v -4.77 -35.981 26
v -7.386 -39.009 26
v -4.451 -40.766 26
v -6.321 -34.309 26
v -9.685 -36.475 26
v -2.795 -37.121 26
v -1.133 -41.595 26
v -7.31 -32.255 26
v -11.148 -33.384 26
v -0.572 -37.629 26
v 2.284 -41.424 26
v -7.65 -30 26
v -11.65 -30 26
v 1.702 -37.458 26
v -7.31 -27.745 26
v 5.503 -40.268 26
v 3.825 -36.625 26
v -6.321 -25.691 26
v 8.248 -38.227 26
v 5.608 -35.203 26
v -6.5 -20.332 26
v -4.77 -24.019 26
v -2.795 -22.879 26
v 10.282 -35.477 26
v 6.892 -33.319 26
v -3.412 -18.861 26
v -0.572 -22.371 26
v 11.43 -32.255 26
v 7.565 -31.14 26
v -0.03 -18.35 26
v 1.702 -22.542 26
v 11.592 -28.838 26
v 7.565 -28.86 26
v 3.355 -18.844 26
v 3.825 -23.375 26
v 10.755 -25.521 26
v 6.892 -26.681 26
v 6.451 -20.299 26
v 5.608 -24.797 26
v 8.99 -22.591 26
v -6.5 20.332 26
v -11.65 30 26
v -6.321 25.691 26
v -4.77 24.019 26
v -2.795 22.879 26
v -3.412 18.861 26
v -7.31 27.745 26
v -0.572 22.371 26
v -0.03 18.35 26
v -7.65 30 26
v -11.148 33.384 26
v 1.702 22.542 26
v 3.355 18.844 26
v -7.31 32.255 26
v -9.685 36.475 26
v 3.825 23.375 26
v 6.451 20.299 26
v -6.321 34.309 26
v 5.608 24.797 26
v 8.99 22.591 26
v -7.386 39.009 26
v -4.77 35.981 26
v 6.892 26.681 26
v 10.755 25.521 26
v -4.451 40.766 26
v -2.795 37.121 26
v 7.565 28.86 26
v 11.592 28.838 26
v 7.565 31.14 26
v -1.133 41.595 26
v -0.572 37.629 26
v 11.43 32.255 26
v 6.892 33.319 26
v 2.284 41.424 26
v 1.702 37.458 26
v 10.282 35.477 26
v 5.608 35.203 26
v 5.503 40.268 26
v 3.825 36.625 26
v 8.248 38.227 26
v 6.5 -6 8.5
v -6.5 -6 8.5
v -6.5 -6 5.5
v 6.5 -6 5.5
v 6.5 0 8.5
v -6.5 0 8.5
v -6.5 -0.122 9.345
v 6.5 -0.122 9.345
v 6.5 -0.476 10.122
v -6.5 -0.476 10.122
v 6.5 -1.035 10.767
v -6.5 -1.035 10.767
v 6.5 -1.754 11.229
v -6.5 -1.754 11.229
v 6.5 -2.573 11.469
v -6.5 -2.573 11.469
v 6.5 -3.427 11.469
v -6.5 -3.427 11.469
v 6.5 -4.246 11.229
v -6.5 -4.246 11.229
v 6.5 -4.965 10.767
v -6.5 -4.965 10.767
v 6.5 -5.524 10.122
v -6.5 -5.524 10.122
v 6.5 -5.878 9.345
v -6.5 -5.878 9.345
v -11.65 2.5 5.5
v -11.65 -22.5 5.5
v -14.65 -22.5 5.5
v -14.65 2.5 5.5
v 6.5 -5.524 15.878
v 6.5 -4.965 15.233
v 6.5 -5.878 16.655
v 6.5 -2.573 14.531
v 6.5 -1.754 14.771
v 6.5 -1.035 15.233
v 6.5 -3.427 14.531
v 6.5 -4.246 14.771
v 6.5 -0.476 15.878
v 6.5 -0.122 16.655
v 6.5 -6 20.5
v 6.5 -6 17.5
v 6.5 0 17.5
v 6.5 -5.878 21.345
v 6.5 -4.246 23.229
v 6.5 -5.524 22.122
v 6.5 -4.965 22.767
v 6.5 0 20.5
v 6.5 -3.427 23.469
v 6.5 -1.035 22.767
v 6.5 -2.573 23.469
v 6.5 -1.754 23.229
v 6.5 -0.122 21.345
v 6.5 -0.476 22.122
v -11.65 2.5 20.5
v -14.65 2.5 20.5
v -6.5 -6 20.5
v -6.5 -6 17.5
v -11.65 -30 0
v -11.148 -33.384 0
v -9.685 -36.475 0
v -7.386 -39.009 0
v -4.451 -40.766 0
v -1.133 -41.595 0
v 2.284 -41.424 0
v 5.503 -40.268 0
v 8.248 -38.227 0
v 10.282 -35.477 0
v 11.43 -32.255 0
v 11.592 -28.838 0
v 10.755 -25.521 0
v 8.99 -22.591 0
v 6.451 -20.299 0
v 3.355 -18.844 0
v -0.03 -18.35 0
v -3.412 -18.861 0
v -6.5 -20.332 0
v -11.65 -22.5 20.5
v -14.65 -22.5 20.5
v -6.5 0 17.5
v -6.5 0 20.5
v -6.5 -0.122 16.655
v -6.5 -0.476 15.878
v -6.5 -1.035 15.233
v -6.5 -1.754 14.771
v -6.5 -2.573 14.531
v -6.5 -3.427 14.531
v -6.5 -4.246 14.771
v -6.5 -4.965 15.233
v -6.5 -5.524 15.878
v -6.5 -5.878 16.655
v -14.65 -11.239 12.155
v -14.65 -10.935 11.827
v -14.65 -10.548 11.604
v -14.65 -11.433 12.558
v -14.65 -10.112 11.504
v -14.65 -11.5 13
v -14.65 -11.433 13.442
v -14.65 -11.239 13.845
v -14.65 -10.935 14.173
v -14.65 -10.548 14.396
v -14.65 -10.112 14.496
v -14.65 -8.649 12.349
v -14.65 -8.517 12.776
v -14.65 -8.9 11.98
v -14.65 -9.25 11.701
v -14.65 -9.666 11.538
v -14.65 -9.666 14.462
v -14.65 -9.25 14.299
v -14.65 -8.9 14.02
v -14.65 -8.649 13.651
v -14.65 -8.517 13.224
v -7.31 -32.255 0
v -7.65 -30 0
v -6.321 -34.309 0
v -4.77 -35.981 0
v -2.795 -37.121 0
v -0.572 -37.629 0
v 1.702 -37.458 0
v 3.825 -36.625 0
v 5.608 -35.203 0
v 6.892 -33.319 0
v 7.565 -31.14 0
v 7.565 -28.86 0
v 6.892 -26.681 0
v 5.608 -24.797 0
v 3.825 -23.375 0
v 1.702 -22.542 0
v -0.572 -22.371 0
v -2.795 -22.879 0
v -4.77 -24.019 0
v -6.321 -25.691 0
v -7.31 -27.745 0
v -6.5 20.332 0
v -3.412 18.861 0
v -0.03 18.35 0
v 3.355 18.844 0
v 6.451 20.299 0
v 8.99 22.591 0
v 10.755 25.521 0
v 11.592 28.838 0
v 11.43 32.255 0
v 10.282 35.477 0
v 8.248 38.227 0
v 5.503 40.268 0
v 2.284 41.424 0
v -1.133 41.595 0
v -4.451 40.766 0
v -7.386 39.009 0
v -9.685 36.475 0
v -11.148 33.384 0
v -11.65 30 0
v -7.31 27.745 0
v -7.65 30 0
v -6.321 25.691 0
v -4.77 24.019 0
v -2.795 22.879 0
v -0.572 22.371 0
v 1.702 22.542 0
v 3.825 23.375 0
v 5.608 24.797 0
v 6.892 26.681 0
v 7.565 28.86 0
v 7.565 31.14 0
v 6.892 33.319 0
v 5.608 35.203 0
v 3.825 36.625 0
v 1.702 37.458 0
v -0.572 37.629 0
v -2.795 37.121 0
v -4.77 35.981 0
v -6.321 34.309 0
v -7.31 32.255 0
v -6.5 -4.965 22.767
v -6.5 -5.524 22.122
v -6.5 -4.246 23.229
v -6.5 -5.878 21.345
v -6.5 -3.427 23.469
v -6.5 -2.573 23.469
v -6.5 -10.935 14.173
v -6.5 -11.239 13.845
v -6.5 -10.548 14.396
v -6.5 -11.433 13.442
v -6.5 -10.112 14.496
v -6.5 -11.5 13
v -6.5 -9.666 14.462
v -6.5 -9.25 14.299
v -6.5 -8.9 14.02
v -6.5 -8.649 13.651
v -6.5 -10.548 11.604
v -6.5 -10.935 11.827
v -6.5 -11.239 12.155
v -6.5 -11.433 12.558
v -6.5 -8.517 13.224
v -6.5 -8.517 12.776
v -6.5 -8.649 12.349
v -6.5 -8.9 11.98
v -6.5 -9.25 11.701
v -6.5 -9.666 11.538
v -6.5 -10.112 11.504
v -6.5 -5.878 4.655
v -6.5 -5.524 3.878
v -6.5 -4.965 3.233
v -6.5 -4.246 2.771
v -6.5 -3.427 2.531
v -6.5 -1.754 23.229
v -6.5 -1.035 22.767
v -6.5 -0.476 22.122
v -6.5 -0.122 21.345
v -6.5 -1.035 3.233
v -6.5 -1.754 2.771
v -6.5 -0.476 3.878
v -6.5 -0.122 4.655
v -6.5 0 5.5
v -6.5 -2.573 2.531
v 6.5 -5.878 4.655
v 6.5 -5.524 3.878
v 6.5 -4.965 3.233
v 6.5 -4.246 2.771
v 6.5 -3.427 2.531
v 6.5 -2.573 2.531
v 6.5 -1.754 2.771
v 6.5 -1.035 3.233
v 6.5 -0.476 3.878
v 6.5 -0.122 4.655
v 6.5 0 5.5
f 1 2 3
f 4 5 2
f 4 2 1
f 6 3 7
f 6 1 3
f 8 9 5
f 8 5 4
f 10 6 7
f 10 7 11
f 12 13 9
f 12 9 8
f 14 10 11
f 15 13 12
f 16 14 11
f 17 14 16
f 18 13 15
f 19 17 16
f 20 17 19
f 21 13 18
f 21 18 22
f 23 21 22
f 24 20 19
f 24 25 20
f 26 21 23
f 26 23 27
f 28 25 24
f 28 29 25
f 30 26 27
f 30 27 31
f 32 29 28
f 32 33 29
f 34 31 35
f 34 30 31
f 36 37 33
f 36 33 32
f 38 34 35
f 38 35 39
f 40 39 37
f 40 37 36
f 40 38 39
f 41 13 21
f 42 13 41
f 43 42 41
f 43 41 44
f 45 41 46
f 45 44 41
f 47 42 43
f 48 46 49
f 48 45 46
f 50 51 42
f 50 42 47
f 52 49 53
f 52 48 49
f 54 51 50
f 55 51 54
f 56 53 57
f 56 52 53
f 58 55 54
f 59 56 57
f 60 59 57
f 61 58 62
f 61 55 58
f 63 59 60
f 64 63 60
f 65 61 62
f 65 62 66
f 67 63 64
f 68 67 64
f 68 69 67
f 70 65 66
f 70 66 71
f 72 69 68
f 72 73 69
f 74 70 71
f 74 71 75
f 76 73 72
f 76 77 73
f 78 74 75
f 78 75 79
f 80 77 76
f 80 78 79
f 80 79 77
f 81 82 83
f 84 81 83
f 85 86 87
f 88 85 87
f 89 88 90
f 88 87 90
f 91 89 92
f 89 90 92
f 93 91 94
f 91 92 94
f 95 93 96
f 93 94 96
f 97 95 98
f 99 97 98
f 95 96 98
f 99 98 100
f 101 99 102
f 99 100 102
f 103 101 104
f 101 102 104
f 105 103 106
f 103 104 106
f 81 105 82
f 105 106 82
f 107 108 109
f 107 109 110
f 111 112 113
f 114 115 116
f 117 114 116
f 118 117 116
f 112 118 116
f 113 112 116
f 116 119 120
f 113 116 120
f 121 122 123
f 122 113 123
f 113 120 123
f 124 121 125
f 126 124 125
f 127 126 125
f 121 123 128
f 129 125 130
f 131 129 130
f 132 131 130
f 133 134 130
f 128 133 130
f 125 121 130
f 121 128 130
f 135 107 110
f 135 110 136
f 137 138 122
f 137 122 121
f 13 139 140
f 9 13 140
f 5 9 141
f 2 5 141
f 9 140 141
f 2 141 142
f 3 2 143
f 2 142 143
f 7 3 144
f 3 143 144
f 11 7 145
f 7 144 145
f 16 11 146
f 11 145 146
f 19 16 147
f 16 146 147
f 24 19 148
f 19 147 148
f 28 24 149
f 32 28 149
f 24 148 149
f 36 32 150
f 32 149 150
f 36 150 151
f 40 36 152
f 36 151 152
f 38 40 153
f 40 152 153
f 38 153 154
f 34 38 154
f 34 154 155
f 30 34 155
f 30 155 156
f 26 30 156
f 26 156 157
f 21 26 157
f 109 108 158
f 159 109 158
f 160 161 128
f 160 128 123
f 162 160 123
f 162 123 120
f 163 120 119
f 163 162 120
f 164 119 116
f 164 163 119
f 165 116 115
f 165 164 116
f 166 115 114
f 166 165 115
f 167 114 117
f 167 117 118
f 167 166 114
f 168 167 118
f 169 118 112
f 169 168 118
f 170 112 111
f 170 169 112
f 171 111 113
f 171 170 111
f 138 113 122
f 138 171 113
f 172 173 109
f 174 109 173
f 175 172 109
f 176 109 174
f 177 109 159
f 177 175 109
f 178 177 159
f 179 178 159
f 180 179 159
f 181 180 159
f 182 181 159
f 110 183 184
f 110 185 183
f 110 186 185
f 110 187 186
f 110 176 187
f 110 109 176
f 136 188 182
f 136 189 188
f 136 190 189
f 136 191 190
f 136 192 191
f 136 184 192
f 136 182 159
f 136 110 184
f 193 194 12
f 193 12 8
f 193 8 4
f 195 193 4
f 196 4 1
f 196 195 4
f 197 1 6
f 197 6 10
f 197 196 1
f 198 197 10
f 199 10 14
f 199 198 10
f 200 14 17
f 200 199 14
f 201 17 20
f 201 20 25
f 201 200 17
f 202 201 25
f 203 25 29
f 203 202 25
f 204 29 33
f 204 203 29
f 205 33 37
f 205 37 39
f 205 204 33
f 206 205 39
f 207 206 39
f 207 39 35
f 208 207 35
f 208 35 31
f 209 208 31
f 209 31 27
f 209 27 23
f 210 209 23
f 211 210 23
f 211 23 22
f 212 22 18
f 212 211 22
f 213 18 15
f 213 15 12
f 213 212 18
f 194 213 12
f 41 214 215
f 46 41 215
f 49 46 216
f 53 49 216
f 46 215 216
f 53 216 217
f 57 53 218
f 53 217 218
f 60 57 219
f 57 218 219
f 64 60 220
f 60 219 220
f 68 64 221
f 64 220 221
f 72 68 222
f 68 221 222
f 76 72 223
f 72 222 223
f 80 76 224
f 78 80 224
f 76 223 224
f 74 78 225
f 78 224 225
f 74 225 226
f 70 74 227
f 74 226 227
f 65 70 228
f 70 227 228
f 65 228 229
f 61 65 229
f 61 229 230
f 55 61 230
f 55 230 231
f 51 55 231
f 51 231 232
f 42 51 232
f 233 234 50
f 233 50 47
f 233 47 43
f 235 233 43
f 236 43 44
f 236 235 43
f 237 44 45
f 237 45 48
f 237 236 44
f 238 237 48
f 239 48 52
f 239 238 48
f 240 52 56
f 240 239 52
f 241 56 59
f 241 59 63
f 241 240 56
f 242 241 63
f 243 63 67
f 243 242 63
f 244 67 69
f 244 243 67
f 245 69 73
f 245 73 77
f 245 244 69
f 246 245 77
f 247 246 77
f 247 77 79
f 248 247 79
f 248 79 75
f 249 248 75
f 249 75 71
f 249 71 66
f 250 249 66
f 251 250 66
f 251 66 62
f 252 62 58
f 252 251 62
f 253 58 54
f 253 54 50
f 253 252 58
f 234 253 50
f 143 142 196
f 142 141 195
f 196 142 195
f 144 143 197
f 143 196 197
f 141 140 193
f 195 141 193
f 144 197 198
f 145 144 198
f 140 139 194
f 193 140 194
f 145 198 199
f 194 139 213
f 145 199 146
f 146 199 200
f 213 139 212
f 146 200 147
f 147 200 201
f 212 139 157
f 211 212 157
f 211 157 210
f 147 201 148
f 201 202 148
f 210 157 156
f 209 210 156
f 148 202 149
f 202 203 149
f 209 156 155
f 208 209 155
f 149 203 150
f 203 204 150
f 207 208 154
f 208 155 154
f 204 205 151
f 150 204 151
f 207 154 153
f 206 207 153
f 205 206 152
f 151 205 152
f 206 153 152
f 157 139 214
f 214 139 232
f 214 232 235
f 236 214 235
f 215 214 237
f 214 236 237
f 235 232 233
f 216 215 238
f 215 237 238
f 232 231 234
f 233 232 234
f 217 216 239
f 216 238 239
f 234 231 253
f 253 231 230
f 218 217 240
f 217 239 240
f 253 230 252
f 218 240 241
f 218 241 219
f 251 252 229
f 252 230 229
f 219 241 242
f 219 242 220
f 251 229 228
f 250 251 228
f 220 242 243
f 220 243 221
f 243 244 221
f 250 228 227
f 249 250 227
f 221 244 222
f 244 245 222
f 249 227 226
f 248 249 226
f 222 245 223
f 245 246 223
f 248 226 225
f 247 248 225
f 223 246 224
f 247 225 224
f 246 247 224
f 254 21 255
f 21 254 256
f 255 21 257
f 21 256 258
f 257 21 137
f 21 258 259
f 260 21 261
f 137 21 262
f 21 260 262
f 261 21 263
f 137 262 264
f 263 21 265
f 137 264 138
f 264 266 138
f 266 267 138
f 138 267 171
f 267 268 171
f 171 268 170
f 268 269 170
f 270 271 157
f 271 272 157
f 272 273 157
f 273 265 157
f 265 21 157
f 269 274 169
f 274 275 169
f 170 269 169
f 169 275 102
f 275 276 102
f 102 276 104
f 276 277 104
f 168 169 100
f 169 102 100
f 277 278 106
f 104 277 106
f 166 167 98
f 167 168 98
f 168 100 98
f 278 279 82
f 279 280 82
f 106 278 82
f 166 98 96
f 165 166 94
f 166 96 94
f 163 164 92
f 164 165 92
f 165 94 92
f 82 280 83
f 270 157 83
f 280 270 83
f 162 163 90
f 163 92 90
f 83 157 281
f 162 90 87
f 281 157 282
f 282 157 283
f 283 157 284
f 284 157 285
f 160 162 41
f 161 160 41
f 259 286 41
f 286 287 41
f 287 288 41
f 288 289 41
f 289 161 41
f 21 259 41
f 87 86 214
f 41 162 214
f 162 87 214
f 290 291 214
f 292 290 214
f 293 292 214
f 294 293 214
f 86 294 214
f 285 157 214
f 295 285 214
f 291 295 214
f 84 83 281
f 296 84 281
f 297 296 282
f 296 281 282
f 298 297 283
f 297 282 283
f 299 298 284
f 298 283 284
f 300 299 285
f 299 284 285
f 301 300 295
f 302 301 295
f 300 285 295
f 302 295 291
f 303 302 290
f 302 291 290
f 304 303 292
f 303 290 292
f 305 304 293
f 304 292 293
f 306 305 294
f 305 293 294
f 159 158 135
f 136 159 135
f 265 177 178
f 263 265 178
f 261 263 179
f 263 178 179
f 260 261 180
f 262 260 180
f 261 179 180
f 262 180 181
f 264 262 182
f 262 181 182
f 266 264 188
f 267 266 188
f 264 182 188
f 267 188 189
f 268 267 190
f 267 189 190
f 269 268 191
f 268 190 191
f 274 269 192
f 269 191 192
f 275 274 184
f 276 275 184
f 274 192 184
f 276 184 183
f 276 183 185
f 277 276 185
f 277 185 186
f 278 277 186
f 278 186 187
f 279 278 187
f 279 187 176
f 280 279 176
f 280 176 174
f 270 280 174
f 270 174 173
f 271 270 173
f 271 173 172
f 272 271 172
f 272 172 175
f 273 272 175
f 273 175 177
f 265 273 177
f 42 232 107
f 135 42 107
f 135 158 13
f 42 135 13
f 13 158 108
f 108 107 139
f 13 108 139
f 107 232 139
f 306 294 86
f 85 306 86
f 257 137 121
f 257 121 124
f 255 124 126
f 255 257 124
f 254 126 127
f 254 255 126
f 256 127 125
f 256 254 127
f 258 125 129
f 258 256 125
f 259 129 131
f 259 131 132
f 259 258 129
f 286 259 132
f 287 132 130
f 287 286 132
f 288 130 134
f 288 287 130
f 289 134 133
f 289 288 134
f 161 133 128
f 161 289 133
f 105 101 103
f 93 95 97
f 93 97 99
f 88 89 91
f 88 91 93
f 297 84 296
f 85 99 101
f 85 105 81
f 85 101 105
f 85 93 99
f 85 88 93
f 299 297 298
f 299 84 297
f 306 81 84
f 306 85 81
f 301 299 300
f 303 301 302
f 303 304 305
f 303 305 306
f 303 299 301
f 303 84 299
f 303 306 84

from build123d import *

# Parameters (mm, degrees)
ESBO_O1_R                = 7.65
RESSALTO_EXTRUS_O1_DEPTH = 26
RESSALTO_EXTRUS_O2_DEPTH = 13
ESBO_O7_W                = 15
ESBO_O7_H                = 25
RESSALTO_EXTRUS_O3_DEPTH = 3
ESBO_O8_R                = 1.5
CORTE_EXTRUS_O1_DEPTH    = 15


with BuildPart() as part:
    # Esboço1 → Ressalto-extrusão1 (new body)
    with BuildSketch(Plane.XY):
        with BuildLine():
            Line((-11.65, 30), (-11.65, 28))
            Line((-11.65, 28), (-11.65, -30))
            ThreePointArc((-11.65, -30), (10.282205503, -35.477111465), (-6.5, -20.331882293))
            Line((-6.5, -20.331882293), (-6.5, 20.331882293))
            ThreePointArc((-6.5, 20.331882293), (10.282205503, 35.477111465), (-11.65, 30))
        make_face()
        with Locations((0, 30)):
            Circle(ESBO_O1_R, mode=Mode.SUBTRACT)
        with Locations((0, -30)):
            Circle(ESBO_O1_R, mode=Mode.SUBTRACT)
    extrude(amount=RESSALTO_EXTRUS_O1_DEPTH)

    # Esboço6 → Ressalto-extrusão2 (add)
    with BuildSketch(Plane(origin=(-6.5, 0, 0), x_dir=(0, 0, -1), z_dir=(1, 0, 0))):
        with BuildLine():
            Line((-17.5, -6), (-20.5, -6))
            ThreePointArc((-20.5, -6), (-23.5, -3), (-20.5, 0))
            Line((-20.5, 0), (-17.5, 0))
            ThreePointArc((-17.5, 0), (-14.5, -3), (-17.5, -6))
        make_face()
        with BuildLine():
            Line((-8.5, -6), (-5.5, -6))
            ThreePointArc((-5.5, -6), (-2.5, -3), (-5.5, 0))
            Line((-5.5, 0), (-8.5, 0))
            ThreePointArc((-8.5, 0), (-11.5, -3), (-8.5, -6))
        make_face()
    extrude(amount=RESSALTO_EXTRUS_O2_DEPTH)

    # Esboço7 → Ressalto-extrusão3 (add)
    with BuildSketch(Plane.ZY.offset(11.65)):
        with Locations((13, -10)):
            Rectangle(ESBO_O7_W, ESBO_O7_H)
    extrude(amount=RESSALTO_EXTRUS_O3_DEPTH)

    # Esboço8 → Corte-extrusão1 (cut)
    with BuildSketch(Plane.ZY.offset(14.65)):
        with Locations((13, -10)):
            Circle(ESBO_O8_R)
    extrude(amount=-CORTE_EXTRUS_O1_DEPTH, mode=Mode.SUBTRACT)


solid = part.part
